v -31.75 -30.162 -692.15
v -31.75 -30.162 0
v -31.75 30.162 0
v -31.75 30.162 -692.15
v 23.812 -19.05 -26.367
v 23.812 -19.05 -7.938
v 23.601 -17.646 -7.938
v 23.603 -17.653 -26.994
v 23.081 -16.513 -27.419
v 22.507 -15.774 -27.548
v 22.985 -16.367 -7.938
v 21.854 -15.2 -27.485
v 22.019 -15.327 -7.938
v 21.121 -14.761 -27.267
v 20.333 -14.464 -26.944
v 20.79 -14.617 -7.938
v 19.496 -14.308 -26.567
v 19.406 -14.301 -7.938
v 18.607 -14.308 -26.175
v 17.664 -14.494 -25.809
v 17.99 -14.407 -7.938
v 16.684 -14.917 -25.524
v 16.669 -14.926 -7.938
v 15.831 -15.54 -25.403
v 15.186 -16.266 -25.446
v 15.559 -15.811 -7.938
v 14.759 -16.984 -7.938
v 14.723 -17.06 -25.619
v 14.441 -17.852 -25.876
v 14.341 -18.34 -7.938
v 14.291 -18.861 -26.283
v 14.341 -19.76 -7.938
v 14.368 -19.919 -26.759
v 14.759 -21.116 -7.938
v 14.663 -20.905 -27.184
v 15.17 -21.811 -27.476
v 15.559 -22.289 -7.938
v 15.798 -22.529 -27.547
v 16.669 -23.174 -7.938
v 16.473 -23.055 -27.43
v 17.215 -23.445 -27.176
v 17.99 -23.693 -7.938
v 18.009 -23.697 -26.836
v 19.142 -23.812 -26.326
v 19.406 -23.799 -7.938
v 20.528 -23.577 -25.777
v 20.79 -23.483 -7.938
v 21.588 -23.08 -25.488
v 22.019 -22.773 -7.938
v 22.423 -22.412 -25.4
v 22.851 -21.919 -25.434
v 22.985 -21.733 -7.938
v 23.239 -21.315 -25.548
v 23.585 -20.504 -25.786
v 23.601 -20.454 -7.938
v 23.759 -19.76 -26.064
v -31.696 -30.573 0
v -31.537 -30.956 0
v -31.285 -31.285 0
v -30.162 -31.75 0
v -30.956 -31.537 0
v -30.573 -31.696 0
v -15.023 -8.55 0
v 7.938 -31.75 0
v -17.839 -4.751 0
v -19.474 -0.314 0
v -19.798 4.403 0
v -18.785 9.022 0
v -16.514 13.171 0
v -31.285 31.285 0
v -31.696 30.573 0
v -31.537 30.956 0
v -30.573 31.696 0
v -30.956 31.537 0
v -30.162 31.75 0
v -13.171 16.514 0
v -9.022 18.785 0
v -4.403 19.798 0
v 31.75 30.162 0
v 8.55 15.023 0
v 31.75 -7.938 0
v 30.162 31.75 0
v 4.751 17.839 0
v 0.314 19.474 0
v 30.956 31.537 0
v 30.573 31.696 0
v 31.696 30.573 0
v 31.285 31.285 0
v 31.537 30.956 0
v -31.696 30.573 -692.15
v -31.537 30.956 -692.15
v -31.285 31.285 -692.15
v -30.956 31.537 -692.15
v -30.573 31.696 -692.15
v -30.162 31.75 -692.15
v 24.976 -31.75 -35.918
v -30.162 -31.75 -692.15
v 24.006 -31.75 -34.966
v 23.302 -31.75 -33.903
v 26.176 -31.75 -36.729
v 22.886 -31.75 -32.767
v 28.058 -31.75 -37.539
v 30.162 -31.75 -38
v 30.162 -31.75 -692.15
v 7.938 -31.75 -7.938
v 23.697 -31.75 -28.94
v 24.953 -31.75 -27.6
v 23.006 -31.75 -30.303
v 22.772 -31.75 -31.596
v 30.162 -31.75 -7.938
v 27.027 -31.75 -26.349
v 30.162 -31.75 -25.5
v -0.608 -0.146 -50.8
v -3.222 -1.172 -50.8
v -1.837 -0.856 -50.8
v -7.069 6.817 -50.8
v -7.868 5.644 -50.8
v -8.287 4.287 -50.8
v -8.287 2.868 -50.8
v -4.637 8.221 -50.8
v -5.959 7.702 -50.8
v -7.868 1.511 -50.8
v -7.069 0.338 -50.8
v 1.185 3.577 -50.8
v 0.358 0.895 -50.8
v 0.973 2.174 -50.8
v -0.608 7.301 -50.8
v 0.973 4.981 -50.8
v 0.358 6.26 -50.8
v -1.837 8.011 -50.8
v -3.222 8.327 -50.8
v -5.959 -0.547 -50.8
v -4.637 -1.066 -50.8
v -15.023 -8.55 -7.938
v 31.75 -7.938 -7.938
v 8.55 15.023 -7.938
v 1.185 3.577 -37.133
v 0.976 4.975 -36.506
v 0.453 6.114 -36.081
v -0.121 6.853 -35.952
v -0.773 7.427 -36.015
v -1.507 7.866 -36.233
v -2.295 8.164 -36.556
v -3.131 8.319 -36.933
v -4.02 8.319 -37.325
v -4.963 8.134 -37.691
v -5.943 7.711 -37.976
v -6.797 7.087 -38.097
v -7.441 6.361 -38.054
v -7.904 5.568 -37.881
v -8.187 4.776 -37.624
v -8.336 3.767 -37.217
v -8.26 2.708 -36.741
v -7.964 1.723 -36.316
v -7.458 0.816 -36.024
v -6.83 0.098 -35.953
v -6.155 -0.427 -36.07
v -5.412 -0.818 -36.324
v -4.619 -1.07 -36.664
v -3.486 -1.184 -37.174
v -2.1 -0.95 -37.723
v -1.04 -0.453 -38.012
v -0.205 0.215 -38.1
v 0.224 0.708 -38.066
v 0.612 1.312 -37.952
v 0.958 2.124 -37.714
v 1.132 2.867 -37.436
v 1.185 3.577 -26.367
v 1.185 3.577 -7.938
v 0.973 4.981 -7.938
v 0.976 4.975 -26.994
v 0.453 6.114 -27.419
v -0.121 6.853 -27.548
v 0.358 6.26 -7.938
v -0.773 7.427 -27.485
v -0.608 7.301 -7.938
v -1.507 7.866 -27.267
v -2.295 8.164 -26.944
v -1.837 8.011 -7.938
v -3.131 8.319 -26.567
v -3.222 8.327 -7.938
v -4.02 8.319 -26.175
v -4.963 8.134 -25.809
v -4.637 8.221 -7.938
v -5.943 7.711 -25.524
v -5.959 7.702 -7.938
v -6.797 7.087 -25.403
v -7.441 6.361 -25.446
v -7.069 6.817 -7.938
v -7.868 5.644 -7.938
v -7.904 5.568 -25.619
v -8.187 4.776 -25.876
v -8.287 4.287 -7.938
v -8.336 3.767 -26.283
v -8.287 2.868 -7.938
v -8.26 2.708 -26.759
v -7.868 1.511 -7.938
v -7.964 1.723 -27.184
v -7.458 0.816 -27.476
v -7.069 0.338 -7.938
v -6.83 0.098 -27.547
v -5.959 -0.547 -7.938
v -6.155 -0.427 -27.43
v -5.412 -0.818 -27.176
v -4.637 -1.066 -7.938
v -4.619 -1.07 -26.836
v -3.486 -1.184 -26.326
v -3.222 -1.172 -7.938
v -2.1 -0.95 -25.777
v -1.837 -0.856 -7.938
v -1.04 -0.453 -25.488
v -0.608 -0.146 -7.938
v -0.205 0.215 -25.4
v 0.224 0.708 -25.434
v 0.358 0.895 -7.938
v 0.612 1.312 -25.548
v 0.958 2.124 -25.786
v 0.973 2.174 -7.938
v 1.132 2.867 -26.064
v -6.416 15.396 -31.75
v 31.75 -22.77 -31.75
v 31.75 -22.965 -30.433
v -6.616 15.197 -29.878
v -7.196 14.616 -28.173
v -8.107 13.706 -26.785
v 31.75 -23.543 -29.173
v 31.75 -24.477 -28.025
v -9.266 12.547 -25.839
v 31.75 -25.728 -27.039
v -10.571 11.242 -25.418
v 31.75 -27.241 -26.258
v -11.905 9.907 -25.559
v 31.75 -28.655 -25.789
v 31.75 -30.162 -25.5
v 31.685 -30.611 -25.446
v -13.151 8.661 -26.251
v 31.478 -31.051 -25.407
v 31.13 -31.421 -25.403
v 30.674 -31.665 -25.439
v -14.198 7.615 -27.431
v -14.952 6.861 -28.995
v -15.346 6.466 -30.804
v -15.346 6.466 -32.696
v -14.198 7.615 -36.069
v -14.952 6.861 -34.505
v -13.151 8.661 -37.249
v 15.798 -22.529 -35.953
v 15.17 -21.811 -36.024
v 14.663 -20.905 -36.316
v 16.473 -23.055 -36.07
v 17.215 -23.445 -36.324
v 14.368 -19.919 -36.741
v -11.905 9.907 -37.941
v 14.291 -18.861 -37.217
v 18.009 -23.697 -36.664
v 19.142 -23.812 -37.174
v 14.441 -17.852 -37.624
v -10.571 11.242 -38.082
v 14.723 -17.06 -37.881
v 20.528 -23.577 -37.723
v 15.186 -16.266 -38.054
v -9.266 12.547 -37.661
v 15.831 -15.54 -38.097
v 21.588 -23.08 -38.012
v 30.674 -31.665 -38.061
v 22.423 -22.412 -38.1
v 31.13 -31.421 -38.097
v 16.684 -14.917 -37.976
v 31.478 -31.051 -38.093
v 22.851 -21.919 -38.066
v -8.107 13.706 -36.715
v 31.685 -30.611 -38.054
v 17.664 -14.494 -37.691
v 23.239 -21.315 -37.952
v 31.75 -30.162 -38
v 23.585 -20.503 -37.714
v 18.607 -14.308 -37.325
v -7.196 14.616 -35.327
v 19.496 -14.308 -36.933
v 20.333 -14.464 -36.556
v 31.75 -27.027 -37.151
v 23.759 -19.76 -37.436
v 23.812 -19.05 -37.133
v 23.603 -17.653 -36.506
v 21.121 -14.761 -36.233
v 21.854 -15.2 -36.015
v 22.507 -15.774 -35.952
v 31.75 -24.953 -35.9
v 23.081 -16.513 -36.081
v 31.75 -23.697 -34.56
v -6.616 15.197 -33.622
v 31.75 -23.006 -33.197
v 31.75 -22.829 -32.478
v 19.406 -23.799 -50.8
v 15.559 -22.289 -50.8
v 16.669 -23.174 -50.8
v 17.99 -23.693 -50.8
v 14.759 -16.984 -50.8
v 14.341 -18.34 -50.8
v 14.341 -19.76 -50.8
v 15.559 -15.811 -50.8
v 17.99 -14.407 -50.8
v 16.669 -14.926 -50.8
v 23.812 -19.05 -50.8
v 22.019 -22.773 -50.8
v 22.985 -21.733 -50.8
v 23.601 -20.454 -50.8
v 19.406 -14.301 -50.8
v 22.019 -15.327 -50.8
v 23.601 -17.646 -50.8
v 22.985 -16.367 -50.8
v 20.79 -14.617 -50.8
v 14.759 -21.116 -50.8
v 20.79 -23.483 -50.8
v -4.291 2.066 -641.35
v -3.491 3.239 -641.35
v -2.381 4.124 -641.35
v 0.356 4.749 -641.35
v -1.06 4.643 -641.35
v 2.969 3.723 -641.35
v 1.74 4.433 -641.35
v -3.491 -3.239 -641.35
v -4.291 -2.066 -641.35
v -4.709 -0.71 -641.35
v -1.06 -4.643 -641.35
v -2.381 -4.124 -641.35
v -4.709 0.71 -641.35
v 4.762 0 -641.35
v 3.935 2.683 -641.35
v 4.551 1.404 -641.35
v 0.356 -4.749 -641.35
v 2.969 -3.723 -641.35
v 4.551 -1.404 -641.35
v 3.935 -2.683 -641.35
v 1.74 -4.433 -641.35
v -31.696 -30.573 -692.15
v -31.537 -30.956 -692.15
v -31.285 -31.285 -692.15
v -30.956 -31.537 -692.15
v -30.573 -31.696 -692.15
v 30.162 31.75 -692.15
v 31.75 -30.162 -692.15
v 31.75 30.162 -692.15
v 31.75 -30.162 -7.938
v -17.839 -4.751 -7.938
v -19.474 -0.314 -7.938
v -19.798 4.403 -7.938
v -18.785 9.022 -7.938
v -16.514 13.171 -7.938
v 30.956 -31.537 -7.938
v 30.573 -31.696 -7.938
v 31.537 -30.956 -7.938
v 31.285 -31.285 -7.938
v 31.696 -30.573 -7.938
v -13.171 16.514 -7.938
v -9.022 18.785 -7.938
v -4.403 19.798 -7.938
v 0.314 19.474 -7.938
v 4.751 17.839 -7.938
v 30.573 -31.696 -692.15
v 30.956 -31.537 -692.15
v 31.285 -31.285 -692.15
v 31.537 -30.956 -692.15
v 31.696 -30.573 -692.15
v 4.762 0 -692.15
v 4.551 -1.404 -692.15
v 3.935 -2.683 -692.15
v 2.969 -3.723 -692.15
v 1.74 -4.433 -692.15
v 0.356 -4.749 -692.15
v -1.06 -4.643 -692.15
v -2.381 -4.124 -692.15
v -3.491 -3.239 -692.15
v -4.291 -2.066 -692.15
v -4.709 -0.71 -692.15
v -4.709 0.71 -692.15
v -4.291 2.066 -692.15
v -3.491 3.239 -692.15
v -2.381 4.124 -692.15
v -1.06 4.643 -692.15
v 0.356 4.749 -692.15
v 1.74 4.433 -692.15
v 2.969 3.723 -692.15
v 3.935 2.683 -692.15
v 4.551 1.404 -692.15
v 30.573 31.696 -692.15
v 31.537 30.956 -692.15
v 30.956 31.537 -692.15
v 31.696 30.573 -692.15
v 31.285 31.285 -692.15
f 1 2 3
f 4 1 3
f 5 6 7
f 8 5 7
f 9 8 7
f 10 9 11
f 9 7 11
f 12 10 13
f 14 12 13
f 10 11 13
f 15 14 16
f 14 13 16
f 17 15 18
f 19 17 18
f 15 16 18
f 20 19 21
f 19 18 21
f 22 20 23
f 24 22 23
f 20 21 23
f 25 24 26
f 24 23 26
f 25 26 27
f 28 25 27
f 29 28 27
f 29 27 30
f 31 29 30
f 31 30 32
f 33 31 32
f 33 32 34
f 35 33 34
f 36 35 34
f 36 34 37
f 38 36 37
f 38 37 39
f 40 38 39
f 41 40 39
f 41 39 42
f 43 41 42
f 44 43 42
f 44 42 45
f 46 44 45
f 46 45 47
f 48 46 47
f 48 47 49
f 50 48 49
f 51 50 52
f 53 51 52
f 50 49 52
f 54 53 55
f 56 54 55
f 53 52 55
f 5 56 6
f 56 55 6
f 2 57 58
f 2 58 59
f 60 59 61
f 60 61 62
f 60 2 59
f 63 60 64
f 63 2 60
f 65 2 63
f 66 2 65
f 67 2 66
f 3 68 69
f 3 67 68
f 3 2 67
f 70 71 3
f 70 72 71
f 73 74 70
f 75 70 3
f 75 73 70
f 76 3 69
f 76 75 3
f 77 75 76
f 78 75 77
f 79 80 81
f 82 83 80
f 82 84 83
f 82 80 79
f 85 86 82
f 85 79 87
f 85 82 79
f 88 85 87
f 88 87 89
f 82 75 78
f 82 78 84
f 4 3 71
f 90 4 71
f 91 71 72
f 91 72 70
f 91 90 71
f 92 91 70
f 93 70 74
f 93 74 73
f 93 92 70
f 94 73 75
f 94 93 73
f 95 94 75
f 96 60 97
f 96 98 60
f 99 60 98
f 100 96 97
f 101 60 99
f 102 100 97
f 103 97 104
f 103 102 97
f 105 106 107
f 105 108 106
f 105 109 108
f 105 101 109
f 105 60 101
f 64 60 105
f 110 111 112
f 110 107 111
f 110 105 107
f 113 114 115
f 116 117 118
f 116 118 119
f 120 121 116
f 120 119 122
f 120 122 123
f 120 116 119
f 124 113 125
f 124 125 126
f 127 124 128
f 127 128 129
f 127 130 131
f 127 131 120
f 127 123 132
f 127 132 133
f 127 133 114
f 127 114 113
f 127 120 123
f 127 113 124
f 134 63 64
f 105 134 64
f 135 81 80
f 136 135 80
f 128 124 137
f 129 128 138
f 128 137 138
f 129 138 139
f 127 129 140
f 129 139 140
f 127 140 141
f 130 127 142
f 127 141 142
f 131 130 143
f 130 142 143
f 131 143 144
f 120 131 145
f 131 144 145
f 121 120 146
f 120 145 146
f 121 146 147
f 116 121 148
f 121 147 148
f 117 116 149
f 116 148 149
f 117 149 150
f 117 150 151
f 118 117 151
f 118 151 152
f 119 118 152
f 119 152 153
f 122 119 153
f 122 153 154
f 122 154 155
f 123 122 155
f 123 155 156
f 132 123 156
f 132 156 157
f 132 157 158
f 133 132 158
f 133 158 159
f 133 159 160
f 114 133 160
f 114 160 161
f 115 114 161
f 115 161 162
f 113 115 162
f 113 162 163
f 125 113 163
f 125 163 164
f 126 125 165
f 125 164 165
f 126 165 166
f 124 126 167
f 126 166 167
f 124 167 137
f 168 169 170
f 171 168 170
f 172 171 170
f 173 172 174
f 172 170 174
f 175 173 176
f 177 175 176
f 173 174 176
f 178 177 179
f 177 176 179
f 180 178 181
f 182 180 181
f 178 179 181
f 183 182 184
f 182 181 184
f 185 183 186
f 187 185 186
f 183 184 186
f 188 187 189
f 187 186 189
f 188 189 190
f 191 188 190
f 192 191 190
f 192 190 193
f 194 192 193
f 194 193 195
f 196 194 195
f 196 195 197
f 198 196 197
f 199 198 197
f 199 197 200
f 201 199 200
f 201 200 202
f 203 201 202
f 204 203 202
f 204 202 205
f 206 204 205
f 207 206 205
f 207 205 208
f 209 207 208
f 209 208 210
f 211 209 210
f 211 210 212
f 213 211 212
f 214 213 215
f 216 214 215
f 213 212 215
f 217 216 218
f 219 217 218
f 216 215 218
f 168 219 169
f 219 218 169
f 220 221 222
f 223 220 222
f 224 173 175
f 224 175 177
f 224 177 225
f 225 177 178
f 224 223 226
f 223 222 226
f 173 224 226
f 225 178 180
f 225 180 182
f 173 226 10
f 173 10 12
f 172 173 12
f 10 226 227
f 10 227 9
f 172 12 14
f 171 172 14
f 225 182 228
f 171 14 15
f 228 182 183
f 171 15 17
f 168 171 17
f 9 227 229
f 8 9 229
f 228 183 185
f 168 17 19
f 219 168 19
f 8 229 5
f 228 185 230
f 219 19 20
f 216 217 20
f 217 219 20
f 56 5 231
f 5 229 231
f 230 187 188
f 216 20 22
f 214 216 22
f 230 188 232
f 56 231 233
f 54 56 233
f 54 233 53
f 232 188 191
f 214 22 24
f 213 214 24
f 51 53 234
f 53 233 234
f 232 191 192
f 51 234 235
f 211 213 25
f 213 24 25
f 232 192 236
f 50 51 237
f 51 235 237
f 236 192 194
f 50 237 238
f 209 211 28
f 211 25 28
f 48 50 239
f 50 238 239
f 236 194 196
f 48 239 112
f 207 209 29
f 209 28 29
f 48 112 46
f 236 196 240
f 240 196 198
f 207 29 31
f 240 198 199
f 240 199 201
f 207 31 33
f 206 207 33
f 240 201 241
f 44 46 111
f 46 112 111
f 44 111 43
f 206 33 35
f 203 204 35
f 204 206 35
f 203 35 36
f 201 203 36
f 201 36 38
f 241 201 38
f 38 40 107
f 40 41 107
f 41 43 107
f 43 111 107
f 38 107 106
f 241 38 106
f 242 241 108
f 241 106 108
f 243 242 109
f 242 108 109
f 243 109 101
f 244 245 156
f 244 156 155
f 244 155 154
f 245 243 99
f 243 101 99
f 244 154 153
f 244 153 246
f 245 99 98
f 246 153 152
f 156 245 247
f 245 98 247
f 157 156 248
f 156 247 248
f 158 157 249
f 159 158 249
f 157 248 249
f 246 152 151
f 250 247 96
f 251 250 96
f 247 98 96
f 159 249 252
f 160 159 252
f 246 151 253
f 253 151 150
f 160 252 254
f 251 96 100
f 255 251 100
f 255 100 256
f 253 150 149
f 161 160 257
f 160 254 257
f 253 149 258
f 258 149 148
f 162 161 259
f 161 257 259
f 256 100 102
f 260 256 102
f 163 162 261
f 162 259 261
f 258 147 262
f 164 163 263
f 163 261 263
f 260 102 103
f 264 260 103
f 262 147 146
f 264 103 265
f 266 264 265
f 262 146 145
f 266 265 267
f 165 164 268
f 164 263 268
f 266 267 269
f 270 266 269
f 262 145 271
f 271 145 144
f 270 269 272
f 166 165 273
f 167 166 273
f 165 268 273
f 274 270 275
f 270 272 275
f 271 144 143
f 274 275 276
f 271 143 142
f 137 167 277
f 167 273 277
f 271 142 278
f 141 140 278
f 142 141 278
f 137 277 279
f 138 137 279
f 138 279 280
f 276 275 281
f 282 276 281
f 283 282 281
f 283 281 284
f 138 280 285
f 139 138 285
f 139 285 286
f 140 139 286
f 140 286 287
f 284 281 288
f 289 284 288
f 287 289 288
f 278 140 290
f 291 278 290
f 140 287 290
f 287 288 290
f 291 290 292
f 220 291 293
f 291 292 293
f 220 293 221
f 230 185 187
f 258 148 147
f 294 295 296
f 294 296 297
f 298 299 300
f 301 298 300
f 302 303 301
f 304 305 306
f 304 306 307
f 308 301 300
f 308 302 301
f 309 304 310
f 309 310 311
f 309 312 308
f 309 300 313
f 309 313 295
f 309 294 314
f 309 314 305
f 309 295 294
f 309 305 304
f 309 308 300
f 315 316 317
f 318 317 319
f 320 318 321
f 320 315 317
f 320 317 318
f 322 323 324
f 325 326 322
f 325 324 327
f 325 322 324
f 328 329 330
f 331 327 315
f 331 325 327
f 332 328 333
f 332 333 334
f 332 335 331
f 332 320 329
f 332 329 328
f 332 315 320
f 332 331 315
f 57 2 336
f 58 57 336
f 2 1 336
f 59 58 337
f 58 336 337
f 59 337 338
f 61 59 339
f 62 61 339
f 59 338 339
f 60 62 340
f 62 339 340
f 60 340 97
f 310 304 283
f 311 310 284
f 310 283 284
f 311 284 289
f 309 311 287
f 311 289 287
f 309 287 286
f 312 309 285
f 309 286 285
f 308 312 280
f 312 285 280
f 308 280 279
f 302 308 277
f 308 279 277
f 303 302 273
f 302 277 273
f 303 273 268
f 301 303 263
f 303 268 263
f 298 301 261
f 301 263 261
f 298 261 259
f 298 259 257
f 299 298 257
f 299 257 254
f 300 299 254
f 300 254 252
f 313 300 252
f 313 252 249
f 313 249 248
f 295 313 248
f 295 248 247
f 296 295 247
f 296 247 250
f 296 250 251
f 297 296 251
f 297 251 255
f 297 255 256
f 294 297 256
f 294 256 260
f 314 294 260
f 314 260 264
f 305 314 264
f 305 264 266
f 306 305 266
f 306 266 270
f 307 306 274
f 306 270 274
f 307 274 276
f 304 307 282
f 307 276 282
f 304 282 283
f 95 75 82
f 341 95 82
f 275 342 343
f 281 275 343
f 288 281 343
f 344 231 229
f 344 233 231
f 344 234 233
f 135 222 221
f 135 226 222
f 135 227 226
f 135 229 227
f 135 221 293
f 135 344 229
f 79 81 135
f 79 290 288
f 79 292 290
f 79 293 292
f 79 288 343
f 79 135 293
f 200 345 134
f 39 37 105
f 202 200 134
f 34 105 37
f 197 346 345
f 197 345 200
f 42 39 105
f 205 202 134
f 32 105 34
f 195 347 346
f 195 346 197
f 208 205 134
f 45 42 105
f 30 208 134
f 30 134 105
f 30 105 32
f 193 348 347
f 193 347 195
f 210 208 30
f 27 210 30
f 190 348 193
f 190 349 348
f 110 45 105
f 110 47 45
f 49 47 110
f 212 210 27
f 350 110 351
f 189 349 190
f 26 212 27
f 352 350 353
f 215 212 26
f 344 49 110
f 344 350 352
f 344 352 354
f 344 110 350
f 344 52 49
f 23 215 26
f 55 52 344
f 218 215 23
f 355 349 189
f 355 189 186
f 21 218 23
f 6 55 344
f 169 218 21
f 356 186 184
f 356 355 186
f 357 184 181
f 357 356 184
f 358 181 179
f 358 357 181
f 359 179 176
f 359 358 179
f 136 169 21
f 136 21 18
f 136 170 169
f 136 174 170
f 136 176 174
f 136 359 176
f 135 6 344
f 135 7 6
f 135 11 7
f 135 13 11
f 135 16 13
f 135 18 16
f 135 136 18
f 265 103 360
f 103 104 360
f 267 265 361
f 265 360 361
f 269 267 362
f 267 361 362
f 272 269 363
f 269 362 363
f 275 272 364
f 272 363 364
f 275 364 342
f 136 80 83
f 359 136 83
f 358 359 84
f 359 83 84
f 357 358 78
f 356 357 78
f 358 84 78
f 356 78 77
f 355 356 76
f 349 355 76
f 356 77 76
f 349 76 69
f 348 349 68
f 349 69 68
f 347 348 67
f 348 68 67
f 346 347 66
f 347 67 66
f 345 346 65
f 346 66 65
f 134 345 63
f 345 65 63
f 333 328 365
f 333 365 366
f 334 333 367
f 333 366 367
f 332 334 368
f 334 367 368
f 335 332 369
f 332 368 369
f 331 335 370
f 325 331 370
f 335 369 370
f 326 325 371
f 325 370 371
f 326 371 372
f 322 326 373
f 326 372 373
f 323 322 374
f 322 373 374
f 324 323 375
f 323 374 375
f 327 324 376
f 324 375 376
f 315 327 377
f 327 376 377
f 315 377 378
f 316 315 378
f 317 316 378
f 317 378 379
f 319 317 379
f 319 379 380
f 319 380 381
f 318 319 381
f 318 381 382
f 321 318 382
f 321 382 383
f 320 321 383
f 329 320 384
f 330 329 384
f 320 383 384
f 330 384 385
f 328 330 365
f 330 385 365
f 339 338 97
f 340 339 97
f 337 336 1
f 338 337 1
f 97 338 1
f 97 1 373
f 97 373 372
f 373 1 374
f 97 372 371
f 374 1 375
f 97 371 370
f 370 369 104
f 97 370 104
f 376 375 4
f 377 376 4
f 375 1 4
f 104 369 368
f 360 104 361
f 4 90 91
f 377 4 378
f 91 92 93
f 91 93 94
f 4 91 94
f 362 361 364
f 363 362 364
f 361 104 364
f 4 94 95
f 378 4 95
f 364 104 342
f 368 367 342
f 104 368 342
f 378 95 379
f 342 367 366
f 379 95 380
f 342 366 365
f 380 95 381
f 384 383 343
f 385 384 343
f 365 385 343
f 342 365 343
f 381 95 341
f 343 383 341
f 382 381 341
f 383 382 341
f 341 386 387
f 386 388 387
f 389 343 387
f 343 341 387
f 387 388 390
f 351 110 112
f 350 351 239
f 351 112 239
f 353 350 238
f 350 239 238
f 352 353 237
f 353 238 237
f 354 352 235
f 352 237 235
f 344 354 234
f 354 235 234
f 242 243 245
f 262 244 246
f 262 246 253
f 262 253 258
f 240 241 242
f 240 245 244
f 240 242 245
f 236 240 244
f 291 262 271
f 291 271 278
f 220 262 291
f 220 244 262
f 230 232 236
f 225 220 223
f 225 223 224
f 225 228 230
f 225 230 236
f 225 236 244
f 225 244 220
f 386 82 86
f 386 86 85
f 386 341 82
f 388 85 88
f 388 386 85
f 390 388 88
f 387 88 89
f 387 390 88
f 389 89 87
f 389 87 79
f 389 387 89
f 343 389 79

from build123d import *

# Parameters (mm, degrees)
F0_W      = 63.5
F0_H      = 63.5
F1_DEPTH  = 692.15
F2_R      = 4.7625
F3_DEPTH  = 50.8
F5_R      = 6.35
F6_DEPTH  = 60.325
F7_R      = 1.5875
F8_R      = 4.7625
F9_DEPTH  = 50.8
F10_R     = 4.7625
F11_DEPTH = 7.9375


with BuildPart() as f1:
    # F0 (on Top) → F1 (new body)
    with BuildSketch(Plane.XY):
        Rectangle(F0_W, F0_H)
    extrude(amount=-F1_DEPTH)

    # F2 (on face) → F3 (cut)
    with BuildSketch(Plane.XY):
        with Locations((-3.577416998, 3.577416998)):
            Circle(F2_R)
        with Locations((19.05, -19.05)):
            Circle(F2_R)
    extrude(amount=-F3_DEPTH, mode=Mode.SUBTRACT)

    # F5 (on face) → F6 (cut)
    with BuildSketch(Plane(origin=(31.75, -31.75, 0), x_dir=(0.7071067812, 0.7071067812, 0), z_dir=(0.7071067812, -0.7071067812, 0))):
        with Locations((0, -31.75)):
            Circle(F5_R)
    extrude(amount=-F6_DEPTH, mode=Mode.SUBTRACT)

    # F7
    f7_edges = [f1.edges().sort_by_distance(p)[0] for p in [
        (-31.75, -31.75, -346.075),
        (-31.75, 31.75, -346.075),
        (31.75, -31.75, -12.7),
        (31.75, -31.75, -365.125),
        (31.75, 31.75, -346.075),
    ]]
    fillet(f7_edges, radius=F7_R)

    # F8 (on face) → F9 (cut)
    with BuildSketch(Plane(origin=(0, 0, -692.15), x_dir=(1, 0, 0), z_dir=(0, 0, -1))):
        Circle(F8_R)
    extrude(amount=-F9_DEPTH, mode=Mode.SUBTRACT)

    # F10 (on face) → F11 (cut)
    with BuildSketch(Plane.XY):
        with BuildLine():
            Line((31.75, -7.9375), (8.5502364646, 15.0226181746))
            ThreePointArc((8.5502364646, 15.0226181746), (-14.9615861589, 14.9615861589), (-15.0226181746, -8.5502364646))
            Line((-15.0226181746, -8.5502364646), (7.9375, -31.75))
            Line((7.9375, -31.75), (30.1625, -31.75))
            ThreePointArc((30.1625, -31.75), (31.2850320151, -31.2850320151), (31.75, -30.1625))
            Line((31.75, -30.1625), (31.75, -7.9375))
        make_face()
        with Locations((19.05, -19.05)):
            Circle(F10_R, mode=Mode.SUBTRACT)
        with Locations((-3.577416998, 3.577416998)):
            Circle(F10_R, mode=Mode.SUBTRACT)
    extrude(amount=-F11_DEPTH, mode=Mode.SUBTRACT)


solid = f1.part
